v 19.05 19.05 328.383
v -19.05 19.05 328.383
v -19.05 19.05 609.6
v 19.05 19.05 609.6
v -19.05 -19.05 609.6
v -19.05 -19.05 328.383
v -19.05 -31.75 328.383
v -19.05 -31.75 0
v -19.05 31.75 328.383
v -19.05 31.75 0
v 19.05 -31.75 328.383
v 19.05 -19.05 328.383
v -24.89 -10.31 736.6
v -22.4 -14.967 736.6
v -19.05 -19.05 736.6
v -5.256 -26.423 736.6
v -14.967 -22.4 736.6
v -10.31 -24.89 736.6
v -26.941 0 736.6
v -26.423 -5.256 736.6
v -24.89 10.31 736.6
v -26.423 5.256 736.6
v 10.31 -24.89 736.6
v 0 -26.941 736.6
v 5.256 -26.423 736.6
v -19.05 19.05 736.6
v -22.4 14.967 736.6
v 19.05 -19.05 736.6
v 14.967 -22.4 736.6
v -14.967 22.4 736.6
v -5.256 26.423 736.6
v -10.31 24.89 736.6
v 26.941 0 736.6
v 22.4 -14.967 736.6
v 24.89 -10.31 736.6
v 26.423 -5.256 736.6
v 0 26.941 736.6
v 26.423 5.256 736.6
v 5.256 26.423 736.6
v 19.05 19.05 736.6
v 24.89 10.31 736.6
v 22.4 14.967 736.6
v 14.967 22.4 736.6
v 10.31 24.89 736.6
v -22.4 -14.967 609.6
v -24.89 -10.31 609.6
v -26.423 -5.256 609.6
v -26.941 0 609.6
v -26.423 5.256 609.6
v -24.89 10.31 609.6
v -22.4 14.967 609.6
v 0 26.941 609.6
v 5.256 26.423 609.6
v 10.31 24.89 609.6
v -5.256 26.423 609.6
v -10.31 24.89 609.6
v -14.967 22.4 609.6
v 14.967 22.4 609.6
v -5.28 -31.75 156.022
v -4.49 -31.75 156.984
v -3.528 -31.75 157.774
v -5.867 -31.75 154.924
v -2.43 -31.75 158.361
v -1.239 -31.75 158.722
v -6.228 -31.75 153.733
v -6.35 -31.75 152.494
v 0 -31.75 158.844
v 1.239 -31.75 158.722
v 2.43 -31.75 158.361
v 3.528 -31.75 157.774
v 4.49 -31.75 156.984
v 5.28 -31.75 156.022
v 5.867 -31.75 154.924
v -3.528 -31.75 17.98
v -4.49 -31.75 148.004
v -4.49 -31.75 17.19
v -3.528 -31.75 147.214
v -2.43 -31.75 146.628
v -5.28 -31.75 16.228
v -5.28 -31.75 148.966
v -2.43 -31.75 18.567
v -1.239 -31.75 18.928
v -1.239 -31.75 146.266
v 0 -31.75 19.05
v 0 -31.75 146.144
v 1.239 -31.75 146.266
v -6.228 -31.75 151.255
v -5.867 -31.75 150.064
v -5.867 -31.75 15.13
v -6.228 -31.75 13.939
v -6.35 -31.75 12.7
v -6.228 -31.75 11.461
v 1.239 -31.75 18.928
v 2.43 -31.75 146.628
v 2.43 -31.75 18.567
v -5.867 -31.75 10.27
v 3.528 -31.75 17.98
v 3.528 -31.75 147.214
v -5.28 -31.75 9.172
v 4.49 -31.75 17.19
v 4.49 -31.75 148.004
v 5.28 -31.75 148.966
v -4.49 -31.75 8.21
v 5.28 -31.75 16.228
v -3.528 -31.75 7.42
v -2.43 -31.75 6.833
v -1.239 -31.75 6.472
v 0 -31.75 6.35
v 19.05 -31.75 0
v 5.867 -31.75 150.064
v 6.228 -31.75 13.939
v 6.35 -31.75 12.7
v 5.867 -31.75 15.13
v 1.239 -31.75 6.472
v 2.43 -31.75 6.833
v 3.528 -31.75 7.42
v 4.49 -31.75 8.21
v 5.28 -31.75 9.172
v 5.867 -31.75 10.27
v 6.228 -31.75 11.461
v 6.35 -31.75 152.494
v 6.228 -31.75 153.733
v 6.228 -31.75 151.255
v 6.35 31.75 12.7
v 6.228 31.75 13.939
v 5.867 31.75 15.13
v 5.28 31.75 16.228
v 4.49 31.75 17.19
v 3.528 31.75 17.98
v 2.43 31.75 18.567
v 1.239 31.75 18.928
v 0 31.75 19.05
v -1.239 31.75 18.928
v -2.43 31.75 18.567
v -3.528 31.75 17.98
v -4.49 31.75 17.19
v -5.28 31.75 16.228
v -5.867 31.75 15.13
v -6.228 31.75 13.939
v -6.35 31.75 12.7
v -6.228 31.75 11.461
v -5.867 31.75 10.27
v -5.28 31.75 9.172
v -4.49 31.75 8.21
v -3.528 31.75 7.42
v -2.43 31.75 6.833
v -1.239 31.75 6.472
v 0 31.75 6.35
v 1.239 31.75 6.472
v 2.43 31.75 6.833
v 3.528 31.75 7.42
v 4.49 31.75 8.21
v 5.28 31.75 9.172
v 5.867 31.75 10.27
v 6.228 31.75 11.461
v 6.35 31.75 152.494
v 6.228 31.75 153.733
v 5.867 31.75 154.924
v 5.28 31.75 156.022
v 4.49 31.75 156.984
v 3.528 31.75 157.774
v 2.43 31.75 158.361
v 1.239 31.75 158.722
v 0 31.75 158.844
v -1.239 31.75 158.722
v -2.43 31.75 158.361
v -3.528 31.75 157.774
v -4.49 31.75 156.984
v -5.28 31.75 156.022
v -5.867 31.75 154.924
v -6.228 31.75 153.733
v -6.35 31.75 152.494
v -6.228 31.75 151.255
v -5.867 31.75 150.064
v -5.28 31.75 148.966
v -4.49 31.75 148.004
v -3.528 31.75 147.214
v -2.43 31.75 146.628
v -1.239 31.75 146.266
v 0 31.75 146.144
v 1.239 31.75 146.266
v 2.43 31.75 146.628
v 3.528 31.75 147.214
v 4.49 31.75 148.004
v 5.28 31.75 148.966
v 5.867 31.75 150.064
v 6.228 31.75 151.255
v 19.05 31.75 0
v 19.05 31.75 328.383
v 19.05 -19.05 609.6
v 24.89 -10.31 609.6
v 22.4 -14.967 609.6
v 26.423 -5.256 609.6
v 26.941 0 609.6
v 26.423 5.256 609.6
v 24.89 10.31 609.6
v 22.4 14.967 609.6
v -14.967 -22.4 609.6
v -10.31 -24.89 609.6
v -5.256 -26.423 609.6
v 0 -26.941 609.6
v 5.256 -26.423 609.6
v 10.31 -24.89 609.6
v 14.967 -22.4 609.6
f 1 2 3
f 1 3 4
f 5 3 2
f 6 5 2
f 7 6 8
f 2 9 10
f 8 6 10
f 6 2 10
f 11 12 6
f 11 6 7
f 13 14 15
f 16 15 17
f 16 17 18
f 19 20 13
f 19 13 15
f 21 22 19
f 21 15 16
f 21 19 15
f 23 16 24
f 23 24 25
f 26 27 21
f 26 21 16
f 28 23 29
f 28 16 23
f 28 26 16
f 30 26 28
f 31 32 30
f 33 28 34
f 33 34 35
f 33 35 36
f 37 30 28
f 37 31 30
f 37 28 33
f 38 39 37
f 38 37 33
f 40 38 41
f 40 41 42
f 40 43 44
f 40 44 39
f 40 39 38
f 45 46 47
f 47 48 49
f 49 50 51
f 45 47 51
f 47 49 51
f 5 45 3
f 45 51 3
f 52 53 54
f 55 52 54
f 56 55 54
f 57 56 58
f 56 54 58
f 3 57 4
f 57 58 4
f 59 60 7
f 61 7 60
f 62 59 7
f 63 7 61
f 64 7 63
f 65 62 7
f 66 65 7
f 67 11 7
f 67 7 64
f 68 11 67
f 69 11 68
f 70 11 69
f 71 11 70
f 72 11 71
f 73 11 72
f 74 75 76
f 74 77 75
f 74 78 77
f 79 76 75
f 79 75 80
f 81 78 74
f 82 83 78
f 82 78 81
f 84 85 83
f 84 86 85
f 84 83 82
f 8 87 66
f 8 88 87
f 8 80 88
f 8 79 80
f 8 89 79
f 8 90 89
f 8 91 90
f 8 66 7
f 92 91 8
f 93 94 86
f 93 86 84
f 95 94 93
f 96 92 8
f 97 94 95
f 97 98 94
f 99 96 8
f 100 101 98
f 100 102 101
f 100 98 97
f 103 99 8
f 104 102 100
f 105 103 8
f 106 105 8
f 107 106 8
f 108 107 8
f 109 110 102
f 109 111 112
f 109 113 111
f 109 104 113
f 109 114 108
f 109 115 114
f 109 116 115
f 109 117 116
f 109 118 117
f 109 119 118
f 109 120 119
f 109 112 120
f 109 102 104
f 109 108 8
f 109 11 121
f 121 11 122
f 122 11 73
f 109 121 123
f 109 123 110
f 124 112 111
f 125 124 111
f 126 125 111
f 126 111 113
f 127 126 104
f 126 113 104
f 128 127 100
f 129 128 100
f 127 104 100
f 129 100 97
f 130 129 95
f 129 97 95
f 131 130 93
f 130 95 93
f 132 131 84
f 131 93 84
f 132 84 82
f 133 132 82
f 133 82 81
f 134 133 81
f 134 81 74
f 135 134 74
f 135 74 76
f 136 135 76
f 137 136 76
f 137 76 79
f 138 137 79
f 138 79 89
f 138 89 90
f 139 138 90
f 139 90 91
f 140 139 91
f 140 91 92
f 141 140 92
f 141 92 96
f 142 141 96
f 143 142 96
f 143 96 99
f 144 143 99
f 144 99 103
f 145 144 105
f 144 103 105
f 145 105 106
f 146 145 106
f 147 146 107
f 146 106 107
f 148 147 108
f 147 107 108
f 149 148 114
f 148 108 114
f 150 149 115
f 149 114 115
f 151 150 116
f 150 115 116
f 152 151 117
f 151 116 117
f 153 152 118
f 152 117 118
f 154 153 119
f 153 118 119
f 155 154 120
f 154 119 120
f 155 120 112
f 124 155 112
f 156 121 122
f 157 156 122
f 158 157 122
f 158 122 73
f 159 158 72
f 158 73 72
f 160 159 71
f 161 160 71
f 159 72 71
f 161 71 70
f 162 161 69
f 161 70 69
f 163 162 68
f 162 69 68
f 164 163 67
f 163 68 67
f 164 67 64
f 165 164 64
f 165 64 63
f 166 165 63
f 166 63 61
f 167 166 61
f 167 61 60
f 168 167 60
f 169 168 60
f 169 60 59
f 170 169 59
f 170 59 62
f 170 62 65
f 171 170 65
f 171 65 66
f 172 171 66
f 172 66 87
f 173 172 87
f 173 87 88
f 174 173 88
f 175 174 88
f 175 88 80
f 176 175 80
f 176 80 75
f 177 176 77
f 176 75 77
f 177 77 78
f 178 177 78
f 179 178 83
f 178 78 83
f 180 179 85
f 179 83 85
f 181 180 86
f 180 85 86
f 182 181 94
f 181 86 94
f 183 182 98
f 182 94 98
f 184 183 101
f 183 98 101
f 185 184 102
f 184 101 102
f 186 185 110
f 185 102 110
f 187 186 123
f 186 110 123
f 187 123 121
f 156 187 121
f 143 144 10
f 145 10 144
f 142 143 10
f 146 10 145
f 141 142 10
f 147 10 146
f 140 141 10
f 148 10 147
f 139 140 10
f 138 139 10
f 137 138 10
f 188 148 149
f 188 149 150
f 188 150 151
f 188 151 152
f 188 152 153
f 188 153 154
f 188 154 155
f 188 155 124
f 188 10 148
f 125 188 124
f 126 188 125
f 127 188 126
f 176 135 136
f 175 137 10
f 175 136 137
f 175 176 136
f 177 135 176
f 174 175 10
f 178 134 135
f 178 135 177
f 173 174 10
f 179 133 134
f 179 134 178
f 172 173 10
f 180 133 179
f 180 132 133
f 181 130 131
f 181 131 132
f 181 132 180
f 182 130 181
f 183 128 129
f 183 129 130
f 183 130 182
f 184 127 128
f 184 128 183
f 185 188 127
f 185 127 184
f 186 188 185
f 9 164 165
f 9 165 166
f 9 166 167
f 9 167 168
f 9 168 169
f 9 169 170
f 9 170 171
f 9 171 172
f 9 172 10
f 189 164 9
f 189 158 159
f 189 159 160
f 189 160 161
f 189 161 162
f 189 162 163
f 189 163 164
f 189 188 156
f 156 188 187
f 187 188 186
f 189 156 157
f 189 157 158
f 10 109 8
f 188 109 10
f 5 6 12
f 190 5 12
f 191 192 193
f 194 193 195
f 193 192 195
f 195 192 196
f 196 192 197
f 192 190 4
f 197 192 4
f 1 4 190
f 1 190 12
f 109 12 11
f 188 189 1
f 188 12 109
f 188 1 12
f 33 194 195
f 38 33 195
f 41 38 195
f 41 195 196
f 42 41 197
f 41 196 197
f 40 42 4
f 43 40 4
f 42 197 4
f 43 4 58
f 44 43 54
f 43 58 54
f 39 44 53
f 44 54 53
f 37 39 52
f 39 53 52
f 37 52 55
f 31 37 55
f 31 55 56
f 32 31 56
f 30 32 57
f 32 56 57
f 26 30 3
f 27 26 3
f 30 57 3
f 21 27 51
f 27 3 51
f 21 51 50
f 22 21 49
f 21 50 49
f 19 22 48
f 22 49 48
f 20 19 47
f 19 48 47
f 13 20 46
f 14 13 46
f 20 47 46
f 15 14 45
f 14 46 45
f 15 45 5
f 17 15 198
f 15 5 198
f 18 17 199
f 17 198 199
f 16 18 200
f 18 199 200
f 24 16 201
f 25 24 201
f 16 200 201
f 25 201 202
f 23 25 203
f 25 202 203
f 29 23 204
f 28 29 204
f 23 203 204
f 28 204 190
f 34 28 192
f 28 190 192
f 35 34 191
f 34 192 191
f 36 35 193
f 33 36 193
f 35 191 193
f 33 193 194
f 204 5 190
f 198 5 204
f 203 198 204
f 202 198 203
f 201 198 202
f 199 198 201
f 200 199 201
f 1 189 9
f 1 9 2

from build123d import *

# Parameters (mm, degrees)
SKETCH2_W           = 38.1
SKETCH2_H           = 38.1
BOSS_EXTRUDE1_DEPTH = 609.6
SKETCH3_R           = 26.940768363
BOSS_EXTRUDE2_DEPTH = 127
CUT_EXTRUDE2_DEPTH  = 127
BOSS_EXTRUDE3_DEPTH = 38.1
SKETCH6_R           = 6.35
CUT_EXTRUDE4_DEPTH  = 64.5
SKETCH7_R           = 6.35
CUT_EXTRUDE5_DEPTH  = 533.4


with BuildPart() as part:
    # Sketch2 → Boss-Extrude1 (new body)
    with BuildSketch(Plane.XY):
        Rectangle(SKETCH2_W, SKETCH2_H)
    extrude(amount=BOSS_EXTRUDE1_DEPTH)

    # Sketch3 → Boss-Extrude2 (add)
    with BuildSketch(Plane.XY.offset(609.6)):
        Circle(SKETCH3_R)
    extrude(amount=BOSS_EXTRUDE2_DEPTH)

    # Sketch4 → Cut-Extrude2 (cut)
    with BuildSketch(Plane.XZ.offset(19.05)):
        with BuildLine():
            ThreePointArc((-6.35, 152.4), (0, 146.05), (6.35, 152.4))
            Line((6.35, 152.4), (-6.35, 152.4))
        make_face()
        with BuildLine():
            Line((-6.35, 152.4), (6.35, 152.4))
            ThreePointArc((6.35, 152.4), (0, 158.75), (-6.35, 152.4))
        make_face()
    extrude(amount=-CUT_EXTRUDE2_DEPTH, mode=Mode.SUBTRACT)

    # Sketch5 → Boss-Extrude3 (add)
    with BuildSketch(Plane(origin=(19.05, 0, 0), x_dir=(0, 0, -1), z_dir=(1, 0, 0))):
        Polygon((0, 0), (0, 31.75), (-328.383343368, 31.75), (-328.383343368, -31.75), (0, -31.75), align=None)
    extrude(amount=-BOSS_EXTRUDE3_DEPTH)

    # Sketch6 → Cut-Extrude4 (cut, through all)
    with BuildSketch(Plane.XZ.offset(31.75)):
        with Locations((0, 152.494180782)):
            Circle(SKETCH6_R)
    extrude(amount=-CUT_EXTRUDE4_DEPTH, mode=Mode.SUBTRACT)

    # Sketch7 → Cut-Extrude5 (cut)
    with BuildSketch(Plane.XZ.offset(31.75)):
        with Locations((0, 12.7)):
            Circle(SKETCH7_R)
    extrude(amount=-CUT_EXTRUDE5_DEPTH, mode=Mode.SUBTRACT)


solid = part.part
